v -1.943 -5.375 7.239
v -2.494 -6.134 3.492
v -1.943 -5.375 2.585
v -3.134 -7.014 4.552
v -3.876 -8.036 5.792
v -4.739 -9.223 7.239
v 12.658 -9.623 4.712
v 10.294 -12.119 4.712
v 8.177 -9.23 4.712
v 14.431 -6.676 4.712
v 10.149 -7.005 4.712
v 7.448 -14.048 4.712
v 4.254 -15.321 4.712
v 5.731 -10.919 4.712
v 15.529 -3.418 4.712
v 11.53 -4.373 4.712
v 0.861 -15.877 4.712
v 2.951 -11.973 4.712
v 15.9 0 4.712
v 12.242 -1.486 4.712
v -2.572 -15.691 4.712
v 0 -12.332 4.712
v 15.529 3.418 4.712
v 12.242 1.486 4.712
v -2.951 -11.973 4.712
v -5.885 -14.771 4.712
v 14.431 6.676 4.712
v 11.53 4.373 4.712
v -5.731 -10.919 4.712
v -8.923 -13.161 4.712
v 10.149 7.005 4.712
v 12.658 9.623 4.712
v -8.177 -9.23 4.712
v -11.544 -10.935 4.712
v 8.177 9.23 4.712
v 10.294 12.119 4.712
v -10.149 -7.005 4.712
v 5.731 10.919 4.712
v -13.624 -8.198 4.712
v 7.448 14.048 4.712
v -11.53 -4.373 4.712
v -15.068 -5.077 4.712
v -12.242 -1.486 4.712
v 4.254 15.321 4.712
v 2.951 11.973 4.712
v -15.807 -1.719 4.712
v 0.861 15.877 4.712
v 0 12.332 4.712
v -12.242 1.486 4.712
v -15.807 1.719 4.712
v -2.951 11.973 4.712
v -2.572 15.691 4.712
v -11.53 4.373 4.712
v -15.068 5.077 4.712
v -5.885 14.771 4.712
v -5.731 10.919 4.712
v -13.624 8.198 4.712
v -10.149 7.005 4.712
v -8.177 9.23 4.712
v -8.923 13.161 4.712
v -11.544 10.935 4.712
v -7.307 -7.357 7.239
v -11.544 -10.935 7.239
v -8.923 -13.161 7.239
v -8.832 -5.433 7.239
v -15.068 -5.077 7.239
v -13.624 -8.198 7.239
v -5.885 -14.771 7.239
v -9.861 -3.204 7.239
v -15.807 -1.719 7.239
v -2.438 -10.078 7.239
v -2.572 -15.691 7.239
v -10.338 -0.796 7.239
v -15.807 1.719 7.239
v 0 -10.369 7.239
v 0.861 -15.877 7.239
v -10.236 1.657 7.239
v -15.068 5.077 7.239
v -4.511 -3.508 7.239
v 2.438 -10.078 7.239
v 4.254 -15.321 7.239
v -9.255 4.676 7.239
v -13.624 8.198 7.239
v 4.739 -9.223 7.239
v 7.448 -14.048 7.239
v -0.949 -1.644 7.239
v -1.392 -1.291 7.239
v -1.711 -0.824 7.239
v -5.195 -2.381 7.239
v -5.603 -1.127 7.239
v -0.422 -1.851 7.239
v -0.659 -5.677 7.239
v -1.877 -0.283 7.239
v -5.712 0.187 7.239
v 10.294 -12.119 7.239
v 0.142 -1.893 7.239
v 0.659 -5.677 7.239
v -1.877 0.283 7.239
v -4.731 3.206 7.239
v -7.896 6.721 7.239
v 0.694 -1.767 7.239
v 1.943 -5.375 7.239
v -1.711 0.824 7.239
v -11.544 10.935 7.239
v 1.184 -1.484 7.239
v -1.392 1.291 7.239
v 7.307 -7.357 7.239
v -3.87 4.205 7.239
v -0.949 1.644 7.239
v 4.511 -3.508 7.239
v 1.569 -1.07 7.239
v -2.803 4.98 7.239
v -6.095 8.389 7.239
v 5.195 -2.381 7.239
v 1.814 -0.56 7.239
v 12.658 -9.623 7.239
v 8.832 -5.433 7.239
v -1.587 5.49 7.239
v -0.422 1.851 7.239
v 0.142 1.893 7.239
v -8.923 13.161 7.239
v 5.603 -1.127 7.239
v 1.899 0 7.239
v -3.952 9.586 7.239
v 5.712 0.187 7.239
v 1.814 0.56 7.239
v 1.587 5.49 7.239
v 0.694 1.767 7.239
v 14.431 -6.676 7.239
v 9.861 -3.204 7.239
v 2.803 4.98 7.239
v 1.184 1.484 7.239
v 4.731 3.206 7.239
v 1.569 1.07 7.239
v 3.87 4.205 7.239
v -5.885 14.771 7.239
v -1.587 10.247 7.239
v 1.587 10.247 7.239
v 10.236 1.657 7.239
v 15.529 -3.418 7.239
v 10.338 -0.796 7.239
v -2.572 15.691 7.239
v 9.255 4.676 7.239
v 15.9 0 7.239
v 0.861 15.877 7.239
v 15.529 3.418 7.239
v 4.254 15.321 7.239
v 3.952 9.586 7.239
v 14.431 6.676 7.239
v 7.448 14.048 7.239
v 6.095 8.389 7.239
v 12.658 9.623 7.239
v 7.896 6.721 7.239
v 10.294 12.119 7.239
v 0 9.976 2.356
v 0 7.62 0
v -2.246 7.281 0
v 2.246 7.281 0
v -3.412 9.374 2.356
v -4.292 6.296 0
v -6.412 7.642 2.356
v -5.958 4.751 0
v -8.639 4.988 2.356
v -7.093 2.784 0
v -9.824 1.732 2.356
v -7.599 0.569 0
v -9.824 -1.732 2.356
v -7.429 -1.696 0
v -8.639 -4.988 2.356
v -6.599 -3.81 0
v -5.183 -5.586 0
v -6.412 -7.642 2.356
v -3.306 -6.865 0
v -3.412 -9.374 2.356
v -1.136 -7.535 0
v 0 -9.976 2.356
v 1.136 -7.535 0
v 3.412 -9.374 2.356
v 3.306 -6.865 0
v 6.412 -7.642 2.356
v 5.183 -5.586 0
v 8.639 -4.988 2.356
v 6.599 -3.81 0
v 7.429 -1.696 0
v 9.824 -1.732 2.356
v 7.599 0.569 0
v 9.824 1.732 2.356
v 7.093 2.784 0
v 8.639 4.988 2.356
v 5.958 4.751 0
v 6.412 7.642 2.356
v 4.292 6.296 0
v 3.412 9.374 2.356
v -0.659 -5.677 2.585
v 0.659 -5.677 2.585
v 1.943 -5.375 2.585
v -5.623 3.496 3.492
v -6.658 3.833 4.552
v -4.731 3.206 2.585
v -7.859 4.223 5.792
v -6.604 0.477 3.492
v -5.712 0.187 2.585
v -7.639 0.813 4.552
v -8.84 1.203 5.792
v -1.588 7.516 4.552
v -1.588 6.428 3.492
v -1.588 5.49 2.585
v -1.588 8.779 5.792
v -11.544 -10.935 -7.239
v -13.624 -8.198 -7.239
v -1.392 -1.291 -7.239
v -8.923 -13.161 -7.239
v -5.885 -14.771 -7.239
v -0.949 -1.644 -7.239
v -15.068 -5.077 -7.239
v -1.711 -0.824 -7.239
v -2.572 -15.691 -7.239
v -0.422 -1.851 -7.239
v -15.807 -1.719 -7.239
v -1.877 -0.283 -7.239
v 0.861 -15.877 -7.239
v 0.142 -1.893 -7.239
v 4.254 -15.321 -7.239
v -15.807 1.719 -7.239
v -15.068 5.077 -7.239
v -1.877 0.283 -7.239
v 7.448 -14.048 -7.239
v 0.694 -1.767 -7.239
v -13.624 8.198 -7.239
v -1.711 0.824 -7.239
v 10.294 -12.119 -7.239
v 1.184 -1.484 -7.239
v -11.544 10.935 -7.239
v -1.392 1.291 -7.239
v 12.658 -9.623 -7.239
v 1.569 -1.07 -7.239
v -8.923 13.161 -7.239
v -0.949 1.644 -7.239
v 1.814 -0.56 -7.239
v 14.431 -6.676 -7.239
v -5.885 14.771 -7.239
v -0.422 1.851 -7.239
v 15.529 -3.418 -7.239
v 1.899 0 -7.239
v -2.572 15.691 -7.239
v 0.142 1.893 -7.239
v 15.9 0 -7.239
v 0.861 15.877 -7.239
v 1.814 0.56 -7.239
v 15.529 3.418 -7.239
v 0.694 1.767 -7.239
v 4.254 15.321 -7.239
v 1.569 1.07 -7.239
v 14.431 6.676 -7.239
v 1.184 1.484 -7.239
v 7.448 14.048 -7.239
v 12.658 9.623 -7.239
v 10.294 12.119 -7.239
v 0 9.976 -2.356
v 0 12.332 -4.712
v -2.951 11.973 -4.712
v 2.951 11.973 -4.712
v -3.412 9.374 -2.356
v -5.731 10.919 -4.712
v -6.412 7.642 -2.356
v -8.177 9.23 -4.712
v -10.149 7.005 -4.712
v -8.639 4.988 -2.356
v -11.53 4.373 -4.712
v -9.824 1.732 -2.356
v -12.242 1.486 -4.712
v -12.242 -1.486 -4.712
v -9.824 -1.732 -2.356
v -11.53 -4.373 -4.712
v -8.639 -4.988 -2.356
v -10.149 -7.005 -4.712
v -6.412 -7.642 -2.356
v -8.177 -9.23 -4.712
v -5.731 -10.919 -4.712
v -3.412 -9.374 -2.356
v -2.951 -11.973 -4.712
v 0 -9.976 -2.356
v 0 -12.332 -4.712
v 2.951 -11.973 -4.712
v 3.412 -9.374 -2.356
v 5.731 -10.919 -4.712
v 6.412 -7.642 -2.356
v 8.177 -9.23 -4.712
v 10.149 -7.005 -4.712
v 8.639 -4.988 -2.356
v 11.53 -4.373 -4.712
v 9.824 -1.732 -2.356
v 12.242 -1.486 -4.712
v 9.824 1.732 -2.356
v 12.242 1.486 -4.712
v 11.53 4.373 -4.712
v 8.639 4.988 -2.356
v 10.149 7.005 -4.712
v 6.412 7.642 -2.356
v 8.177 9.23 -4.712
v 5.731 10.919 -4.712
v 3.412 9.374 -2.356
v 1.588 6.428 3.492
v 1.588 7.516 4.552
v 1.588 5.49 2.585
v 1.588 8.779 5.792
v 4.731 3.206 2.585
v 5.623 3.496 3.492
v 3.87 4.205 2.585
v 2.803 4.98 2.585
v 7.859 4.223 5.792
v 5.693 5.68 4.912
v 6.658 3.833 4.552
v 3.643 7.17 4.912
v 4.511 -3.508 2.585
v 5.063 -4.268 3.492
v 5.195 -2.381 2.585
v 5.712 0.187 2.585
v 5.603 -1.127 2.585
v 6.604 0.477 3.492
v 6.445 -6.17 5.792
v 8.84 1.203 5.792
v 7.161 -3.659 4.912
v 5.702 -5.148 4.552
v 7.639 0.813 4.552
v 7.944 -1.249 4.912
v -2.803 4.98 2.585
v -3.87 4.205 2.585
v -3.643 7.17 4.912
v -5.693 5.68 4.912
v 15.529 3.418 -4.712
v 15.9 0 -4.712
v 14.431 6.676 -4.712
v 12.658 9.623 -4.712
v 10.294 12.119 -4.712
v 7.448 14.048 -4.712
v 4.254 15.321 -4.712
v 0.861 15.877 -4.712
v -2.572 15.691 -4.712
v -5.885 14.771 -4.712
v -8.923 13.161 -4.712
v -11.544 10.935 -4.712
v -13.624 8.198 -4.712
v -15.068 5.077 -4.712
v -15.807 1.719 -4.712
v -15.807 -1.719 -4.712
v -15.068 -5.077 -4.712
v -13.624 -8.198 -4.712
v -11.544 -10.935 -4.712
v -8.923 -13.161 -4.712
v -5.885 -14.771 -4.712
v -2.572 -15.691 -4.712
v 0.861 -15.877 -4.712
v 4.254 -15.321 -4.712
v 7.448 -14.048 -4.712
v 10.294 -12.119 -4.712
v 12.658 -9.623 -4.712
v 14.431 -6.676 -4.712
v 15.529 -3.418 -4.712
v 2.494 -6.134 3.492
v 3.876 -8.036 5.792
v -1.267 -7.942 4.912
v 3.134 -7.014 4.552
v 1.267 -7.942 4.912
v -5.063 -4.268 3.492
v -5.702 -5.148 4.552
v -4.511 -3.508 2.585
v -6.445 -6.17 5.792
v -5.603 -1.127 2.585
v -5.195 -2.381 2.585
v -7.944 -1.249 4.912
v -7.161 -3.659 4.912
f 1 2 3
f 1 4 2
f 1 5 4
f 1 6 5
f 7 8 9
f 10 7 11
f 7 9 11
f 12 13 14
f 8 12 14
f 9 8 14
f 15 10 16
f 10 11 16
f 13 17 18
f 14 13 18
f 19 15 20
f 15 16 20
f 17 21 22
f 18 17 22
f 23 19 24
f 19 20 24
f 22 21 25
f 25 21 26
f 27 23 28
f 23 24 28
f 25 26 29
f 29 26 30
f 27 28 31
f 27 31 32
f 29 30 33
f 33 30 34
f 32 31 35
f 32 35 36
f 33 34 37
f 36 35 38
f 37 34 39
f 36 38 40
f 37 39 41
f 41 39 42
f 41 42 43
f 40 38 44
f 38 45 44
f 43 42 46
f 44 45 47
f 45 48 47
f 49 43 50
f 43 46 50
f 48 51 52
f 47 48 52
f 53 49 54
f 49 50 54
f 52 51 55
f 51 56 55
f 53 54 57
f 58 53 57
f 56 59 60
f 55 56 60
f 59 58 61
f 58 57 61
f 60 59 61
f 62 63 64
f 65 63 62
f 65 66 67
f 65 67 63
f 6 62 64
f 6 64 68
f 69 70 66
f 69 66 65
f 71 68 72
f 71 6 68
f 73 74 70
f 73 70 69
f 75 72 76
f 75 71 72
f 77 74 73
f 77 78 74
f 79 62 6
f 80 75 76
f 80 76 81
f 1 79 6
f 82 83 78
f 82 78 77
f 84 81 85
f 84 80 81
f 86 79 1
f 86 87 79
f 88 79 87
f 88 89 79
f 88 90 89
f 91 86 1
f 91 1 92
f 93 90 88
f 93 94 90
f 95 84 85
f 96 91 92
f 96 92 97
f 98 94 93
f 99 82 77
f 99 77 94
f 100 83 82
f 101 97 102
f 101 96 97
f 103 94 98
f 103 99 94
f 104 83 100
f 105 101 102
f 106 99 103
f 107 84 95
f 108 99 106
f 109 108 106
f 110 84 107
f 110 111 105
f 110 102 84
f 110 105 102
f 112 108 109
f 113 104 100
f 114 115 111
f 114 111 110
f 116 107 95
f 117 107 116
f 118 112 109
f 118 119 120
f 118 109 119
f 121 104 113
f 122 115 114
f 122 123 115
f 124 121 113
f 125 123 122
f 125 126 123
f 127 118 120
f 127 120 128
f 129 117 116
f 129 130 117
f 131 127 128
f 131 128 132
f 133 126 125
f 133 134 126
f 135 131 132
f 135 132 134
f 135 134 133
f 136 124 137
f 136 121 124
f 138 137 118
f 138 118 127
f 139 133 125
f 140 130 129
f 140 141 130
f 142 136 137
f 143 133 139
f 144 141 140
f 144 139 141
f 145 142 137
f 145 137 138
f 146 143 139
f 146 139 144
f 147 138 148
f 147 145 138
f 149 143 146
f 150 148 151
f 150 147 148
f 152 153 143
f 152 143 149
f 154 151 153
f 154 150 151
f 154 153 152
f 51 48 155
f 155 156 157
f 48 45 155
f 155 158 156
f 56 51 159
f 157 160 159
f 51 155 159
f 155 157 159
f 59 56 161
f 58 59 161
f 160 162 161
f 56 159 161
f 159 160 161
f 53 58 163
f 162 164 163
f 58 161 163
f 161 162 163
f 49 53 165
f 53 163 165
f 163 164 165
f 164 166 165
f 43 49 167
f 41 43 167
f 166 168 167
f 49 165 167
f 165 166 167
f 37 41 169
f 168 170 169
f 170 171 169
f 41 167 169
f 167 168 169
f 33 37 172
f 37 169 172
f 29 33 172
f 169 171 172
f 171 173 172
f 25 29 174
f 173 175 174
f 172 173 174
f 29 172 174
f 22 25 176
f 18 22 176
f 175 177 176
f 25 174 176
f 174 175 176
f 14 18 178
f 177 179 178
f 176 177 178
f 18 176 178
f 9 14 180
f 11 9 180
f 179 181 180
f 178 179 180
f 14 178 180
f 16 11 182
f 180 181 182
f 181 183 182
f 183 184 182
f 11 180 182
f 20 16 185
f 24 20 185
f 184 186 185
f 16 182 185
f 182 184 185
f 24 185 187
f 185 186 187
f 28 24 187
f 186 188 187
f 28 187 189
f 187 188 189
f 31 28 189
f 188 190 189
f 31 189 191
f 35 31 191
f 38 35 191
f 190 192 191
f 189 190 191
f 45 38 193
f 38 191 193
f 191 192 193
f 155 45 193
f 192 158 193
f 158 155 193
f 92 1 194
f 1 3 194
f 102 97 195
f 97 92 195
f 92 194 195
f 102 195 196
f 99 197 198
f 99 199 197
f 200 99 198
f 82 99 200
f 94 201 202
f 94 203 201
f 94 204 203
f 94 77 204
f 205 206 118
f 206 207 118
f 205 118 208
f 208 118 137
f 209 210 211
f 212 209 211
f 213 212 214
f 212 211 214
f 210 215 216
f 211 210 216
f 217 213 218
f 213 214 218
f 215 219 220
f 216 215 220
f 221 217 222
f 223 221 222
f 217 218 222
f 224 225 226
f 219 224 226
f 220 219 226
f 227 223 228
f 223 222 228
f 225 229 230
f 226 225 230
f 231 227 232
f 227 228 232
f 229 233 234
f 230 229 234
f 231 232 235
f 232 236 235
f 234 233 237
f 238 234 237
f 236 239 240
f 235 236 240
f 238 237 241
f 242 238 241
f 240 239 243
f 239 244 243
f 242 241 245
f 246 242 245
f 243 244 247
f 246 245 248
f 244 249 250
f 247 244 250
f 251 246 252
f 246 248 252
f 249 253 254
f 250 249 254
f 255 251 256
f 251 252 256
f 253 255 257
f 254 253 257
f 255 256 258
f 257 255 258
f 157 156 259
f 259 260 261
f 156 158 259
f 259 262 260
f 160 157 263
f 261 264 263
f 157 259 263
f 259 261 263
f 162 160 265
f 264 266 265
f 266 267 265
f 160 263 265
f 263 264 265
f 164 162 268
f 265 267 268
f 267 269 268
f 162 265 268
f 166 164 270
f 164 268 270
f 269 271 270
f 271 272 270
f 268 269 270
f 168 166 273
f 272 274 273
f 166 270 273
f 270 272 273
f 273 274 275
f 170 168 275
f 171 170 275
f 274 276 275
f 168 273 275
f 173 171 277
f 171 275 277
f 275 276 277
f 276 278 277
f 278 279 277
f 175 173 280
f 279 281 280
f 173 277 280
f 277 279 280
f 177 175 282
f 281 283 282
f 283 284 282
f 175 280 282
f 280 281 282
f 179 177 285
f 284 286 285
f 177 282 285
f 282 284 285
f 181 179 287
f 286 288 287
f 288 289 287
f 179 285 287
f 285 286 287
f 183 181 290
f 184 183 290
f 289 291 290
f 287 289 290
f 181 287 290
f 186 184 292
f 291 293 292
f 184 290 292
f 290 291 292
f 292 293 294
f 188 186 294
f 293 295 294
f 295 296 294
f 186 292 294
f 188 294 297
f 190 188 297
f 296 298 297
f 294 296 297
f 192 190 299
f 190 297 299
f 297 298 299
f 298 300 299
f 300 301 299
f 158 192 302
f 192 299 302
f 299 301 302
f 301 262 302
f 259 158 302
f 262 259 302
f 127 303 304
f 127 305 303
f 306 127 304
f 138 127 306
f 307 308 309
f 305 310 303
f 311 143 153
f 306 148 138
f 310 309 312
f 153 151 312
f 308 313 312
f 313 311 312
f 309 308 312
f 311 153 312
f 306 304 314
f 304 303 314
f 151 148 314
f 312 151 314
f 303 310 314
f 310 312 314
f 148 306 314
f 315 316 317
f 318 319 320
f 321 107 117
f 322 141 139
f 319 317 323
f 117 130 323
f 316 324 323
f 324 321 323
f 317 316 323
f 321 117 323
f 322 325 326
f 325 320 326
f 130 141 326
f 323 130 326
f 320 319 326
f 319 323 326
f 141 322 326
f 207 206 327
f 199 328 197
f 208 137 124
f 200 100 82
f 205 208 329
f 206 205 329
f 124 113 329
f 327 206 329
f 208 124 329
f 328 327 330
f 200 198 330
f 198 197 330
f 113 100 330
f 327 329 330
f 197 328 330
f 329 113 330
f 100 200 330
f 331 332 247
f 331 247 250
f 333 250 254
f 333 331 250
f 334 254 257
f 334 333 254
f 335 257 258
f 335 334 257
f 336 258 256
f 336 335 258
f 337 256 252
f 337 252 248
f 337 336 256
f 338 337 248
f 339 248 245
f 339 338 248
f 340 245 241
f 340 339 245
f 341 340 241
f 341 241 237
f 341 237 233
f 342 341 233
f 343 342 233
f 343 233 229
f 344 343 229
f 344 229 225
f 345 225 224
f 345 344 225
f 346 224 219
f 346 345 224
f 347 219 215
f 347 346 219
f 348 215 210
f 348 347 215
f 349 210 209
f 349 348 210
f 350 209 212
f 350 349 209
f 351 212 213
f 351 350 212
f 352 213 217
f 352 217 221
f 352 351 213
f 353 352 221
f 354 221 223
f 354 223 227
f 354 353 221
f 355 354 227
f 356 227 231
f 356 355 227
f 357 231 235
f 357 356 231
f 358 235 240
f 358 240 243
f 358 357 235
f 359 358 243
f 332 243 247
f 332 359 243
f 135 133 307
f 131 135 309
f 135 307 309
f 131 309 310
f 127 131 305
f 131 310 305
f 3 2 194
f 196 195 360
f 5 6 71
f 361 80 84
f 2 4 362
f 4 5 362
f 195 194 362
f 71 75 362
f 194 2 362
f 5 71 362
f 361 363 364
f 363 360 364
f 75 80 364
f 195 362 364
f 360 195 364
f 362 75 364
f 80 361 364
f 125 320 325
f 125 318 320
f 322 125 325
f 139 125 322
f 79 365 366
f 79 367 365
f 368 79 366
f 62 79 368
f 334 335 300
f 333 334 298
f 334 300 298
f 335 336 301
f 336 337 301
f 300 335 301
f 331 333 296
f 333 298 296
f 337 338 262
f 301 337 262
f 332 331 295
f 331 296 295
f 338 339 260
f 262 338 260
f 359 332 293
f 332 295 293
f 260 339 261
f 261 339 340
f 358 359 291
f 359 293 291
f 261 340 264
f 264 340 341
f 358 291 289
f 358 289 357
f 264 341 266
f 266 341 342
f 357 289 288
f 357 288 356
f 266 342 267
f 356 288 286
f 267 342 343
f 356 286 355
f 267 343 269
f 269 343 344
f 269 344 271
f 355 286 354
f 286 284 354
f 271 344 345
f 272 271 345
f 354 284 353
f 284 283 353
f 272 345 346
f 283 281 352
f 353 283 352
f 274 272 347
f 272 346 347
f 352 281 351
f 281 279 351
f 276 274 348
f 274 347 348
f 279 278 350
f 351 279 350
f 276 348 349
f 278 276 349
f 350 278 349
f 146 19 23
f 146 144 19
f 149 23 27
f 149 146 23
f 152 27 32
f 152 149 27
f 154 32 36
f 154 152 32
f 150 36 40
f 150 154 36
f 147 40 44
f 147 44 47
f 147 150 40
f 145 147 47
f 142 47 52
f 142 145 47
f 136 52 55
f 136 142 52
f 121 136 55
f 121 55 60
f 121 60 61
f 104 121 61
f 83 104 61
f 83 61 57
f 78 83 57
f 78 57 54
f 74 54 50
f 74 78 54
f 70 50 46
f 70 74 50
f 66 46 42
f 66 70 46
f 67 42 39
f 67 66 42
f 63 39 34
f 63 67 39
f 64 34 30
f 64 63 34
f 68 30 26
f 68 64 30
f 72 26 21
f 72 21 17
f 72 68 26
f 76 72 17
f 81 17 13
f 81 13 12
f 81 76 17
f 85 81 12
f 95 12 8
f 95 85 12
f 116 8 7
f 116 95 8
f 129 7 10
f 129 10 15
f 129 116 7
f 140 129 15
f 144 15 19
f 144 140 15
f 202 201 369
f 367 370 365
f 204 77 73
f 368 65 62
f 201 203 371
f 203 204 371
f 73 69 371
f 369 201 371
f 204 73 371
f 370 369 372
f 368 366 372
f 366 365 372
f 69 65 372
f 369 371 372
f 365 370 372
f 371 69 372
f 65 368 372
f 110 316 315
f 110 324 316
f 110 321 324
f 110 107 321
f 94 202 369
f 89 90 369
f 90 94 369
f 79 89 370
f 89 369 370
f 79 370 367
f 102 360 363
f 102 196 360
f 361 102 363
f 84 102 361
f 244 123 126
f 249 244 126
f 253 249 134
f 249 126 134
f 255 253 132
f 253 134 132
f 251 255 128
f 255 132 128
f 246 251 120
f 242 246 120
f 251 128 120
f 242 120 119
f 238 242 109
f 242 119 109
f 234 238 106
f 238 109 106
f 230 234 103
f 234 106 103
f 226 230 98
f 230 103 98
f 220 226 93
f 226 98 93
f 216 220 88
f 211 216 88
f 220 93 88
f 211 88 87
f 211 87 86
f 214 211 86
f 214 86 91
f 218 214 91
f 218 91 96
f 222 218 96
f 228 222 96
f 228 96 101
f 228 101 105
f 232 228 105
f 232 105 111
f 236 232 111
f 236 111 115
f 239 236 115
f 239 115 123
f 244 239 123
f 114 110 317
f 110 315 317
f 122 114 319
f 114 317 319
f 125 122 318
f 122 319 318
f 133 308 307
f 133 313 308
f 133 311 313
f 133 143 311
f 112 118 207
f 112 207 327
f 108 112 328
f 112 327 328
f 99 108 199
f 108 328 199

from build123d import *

# Parameters (mm, degrees)
F0_R     = 15.9004
F1_DEPTH = 7.239
F2_R     = 1.89865
F3_DEPTH = 14.479
F6_W     = 3.175
F6_H     = 7.507812879


# Not quite as in the source:
# - a feature names something its author has since deleted; it is built from what else it names


with BuildPart() as f1:
    # F0 (on Top) → F1 (new body, symmetric)
    with BuildSketch(Plane.XY):
        Circle(F0_R)
    extrude(amount=F1_DEPTH, both=True)

    # F2 (on face) → F3 (cut, through all)
    with BuildSketch(Plane.XY.offset(7.239)):
        Circle(F2_R)
    extrude(amount=-F3_DEPTH, mode=Mode.SUBTRACT)

    # F4 (on Right) → F5 (revolve, cut)
    with BuildSketch(Plane.YZ):
        Polygon((18.6176884613, -4.7117), (18.6176884613, 4.7117), (12.3317, 4.7117), (7.62, 0), (12.3317, -4.7117), align=None)
        Polygon((5.715, 2.5851280605), (12.0073856063, 8.8775136668), (5.715, 8.8775136668), align=None)
    revolve(axis=Axis((0, 0, 8.1515284255), (0, 0, 1)), mode=Mode.SUBTRACT)

    # F6 (on face) → F7 (join, up to the next surface of F1)
    with BuildSketch(Plane.XY.offset(7.239)):
        with Locations((0, 7.7054322143)):
            Rectangle(F6_W, F6_H)
        Polygon((-10.4079142205, 5.0509326079), (-11.3890431777, 2.0313281687), (-4.248688816, -0.2887136015), (-3.2675598588, 2.7308908377), align=None)
        Polygon((-8.0199447403, -8.3376906272), (-5.4513157831, -10.2039088032), (-1.0383340959, -4.1299605935), (-3.606963053, -2.2637424175), align=None)
        Polygon((5.4513157831, -10.2039088032), (8.0199447403, -8.3376906272), (3.606963053, -2.2637424175), (1.0383340959, -4.1299605935), align=None)
        Polygon((11.3890431777, 2.0313281687), (10.4079142205, 5.0509326079), (3.2675598588, 2.7308908377), (4.248688816, -0.2887136015), align=None)
    extrude(until=Until.NEXT, dir=(0, 0, -1))


solid = f1.part
